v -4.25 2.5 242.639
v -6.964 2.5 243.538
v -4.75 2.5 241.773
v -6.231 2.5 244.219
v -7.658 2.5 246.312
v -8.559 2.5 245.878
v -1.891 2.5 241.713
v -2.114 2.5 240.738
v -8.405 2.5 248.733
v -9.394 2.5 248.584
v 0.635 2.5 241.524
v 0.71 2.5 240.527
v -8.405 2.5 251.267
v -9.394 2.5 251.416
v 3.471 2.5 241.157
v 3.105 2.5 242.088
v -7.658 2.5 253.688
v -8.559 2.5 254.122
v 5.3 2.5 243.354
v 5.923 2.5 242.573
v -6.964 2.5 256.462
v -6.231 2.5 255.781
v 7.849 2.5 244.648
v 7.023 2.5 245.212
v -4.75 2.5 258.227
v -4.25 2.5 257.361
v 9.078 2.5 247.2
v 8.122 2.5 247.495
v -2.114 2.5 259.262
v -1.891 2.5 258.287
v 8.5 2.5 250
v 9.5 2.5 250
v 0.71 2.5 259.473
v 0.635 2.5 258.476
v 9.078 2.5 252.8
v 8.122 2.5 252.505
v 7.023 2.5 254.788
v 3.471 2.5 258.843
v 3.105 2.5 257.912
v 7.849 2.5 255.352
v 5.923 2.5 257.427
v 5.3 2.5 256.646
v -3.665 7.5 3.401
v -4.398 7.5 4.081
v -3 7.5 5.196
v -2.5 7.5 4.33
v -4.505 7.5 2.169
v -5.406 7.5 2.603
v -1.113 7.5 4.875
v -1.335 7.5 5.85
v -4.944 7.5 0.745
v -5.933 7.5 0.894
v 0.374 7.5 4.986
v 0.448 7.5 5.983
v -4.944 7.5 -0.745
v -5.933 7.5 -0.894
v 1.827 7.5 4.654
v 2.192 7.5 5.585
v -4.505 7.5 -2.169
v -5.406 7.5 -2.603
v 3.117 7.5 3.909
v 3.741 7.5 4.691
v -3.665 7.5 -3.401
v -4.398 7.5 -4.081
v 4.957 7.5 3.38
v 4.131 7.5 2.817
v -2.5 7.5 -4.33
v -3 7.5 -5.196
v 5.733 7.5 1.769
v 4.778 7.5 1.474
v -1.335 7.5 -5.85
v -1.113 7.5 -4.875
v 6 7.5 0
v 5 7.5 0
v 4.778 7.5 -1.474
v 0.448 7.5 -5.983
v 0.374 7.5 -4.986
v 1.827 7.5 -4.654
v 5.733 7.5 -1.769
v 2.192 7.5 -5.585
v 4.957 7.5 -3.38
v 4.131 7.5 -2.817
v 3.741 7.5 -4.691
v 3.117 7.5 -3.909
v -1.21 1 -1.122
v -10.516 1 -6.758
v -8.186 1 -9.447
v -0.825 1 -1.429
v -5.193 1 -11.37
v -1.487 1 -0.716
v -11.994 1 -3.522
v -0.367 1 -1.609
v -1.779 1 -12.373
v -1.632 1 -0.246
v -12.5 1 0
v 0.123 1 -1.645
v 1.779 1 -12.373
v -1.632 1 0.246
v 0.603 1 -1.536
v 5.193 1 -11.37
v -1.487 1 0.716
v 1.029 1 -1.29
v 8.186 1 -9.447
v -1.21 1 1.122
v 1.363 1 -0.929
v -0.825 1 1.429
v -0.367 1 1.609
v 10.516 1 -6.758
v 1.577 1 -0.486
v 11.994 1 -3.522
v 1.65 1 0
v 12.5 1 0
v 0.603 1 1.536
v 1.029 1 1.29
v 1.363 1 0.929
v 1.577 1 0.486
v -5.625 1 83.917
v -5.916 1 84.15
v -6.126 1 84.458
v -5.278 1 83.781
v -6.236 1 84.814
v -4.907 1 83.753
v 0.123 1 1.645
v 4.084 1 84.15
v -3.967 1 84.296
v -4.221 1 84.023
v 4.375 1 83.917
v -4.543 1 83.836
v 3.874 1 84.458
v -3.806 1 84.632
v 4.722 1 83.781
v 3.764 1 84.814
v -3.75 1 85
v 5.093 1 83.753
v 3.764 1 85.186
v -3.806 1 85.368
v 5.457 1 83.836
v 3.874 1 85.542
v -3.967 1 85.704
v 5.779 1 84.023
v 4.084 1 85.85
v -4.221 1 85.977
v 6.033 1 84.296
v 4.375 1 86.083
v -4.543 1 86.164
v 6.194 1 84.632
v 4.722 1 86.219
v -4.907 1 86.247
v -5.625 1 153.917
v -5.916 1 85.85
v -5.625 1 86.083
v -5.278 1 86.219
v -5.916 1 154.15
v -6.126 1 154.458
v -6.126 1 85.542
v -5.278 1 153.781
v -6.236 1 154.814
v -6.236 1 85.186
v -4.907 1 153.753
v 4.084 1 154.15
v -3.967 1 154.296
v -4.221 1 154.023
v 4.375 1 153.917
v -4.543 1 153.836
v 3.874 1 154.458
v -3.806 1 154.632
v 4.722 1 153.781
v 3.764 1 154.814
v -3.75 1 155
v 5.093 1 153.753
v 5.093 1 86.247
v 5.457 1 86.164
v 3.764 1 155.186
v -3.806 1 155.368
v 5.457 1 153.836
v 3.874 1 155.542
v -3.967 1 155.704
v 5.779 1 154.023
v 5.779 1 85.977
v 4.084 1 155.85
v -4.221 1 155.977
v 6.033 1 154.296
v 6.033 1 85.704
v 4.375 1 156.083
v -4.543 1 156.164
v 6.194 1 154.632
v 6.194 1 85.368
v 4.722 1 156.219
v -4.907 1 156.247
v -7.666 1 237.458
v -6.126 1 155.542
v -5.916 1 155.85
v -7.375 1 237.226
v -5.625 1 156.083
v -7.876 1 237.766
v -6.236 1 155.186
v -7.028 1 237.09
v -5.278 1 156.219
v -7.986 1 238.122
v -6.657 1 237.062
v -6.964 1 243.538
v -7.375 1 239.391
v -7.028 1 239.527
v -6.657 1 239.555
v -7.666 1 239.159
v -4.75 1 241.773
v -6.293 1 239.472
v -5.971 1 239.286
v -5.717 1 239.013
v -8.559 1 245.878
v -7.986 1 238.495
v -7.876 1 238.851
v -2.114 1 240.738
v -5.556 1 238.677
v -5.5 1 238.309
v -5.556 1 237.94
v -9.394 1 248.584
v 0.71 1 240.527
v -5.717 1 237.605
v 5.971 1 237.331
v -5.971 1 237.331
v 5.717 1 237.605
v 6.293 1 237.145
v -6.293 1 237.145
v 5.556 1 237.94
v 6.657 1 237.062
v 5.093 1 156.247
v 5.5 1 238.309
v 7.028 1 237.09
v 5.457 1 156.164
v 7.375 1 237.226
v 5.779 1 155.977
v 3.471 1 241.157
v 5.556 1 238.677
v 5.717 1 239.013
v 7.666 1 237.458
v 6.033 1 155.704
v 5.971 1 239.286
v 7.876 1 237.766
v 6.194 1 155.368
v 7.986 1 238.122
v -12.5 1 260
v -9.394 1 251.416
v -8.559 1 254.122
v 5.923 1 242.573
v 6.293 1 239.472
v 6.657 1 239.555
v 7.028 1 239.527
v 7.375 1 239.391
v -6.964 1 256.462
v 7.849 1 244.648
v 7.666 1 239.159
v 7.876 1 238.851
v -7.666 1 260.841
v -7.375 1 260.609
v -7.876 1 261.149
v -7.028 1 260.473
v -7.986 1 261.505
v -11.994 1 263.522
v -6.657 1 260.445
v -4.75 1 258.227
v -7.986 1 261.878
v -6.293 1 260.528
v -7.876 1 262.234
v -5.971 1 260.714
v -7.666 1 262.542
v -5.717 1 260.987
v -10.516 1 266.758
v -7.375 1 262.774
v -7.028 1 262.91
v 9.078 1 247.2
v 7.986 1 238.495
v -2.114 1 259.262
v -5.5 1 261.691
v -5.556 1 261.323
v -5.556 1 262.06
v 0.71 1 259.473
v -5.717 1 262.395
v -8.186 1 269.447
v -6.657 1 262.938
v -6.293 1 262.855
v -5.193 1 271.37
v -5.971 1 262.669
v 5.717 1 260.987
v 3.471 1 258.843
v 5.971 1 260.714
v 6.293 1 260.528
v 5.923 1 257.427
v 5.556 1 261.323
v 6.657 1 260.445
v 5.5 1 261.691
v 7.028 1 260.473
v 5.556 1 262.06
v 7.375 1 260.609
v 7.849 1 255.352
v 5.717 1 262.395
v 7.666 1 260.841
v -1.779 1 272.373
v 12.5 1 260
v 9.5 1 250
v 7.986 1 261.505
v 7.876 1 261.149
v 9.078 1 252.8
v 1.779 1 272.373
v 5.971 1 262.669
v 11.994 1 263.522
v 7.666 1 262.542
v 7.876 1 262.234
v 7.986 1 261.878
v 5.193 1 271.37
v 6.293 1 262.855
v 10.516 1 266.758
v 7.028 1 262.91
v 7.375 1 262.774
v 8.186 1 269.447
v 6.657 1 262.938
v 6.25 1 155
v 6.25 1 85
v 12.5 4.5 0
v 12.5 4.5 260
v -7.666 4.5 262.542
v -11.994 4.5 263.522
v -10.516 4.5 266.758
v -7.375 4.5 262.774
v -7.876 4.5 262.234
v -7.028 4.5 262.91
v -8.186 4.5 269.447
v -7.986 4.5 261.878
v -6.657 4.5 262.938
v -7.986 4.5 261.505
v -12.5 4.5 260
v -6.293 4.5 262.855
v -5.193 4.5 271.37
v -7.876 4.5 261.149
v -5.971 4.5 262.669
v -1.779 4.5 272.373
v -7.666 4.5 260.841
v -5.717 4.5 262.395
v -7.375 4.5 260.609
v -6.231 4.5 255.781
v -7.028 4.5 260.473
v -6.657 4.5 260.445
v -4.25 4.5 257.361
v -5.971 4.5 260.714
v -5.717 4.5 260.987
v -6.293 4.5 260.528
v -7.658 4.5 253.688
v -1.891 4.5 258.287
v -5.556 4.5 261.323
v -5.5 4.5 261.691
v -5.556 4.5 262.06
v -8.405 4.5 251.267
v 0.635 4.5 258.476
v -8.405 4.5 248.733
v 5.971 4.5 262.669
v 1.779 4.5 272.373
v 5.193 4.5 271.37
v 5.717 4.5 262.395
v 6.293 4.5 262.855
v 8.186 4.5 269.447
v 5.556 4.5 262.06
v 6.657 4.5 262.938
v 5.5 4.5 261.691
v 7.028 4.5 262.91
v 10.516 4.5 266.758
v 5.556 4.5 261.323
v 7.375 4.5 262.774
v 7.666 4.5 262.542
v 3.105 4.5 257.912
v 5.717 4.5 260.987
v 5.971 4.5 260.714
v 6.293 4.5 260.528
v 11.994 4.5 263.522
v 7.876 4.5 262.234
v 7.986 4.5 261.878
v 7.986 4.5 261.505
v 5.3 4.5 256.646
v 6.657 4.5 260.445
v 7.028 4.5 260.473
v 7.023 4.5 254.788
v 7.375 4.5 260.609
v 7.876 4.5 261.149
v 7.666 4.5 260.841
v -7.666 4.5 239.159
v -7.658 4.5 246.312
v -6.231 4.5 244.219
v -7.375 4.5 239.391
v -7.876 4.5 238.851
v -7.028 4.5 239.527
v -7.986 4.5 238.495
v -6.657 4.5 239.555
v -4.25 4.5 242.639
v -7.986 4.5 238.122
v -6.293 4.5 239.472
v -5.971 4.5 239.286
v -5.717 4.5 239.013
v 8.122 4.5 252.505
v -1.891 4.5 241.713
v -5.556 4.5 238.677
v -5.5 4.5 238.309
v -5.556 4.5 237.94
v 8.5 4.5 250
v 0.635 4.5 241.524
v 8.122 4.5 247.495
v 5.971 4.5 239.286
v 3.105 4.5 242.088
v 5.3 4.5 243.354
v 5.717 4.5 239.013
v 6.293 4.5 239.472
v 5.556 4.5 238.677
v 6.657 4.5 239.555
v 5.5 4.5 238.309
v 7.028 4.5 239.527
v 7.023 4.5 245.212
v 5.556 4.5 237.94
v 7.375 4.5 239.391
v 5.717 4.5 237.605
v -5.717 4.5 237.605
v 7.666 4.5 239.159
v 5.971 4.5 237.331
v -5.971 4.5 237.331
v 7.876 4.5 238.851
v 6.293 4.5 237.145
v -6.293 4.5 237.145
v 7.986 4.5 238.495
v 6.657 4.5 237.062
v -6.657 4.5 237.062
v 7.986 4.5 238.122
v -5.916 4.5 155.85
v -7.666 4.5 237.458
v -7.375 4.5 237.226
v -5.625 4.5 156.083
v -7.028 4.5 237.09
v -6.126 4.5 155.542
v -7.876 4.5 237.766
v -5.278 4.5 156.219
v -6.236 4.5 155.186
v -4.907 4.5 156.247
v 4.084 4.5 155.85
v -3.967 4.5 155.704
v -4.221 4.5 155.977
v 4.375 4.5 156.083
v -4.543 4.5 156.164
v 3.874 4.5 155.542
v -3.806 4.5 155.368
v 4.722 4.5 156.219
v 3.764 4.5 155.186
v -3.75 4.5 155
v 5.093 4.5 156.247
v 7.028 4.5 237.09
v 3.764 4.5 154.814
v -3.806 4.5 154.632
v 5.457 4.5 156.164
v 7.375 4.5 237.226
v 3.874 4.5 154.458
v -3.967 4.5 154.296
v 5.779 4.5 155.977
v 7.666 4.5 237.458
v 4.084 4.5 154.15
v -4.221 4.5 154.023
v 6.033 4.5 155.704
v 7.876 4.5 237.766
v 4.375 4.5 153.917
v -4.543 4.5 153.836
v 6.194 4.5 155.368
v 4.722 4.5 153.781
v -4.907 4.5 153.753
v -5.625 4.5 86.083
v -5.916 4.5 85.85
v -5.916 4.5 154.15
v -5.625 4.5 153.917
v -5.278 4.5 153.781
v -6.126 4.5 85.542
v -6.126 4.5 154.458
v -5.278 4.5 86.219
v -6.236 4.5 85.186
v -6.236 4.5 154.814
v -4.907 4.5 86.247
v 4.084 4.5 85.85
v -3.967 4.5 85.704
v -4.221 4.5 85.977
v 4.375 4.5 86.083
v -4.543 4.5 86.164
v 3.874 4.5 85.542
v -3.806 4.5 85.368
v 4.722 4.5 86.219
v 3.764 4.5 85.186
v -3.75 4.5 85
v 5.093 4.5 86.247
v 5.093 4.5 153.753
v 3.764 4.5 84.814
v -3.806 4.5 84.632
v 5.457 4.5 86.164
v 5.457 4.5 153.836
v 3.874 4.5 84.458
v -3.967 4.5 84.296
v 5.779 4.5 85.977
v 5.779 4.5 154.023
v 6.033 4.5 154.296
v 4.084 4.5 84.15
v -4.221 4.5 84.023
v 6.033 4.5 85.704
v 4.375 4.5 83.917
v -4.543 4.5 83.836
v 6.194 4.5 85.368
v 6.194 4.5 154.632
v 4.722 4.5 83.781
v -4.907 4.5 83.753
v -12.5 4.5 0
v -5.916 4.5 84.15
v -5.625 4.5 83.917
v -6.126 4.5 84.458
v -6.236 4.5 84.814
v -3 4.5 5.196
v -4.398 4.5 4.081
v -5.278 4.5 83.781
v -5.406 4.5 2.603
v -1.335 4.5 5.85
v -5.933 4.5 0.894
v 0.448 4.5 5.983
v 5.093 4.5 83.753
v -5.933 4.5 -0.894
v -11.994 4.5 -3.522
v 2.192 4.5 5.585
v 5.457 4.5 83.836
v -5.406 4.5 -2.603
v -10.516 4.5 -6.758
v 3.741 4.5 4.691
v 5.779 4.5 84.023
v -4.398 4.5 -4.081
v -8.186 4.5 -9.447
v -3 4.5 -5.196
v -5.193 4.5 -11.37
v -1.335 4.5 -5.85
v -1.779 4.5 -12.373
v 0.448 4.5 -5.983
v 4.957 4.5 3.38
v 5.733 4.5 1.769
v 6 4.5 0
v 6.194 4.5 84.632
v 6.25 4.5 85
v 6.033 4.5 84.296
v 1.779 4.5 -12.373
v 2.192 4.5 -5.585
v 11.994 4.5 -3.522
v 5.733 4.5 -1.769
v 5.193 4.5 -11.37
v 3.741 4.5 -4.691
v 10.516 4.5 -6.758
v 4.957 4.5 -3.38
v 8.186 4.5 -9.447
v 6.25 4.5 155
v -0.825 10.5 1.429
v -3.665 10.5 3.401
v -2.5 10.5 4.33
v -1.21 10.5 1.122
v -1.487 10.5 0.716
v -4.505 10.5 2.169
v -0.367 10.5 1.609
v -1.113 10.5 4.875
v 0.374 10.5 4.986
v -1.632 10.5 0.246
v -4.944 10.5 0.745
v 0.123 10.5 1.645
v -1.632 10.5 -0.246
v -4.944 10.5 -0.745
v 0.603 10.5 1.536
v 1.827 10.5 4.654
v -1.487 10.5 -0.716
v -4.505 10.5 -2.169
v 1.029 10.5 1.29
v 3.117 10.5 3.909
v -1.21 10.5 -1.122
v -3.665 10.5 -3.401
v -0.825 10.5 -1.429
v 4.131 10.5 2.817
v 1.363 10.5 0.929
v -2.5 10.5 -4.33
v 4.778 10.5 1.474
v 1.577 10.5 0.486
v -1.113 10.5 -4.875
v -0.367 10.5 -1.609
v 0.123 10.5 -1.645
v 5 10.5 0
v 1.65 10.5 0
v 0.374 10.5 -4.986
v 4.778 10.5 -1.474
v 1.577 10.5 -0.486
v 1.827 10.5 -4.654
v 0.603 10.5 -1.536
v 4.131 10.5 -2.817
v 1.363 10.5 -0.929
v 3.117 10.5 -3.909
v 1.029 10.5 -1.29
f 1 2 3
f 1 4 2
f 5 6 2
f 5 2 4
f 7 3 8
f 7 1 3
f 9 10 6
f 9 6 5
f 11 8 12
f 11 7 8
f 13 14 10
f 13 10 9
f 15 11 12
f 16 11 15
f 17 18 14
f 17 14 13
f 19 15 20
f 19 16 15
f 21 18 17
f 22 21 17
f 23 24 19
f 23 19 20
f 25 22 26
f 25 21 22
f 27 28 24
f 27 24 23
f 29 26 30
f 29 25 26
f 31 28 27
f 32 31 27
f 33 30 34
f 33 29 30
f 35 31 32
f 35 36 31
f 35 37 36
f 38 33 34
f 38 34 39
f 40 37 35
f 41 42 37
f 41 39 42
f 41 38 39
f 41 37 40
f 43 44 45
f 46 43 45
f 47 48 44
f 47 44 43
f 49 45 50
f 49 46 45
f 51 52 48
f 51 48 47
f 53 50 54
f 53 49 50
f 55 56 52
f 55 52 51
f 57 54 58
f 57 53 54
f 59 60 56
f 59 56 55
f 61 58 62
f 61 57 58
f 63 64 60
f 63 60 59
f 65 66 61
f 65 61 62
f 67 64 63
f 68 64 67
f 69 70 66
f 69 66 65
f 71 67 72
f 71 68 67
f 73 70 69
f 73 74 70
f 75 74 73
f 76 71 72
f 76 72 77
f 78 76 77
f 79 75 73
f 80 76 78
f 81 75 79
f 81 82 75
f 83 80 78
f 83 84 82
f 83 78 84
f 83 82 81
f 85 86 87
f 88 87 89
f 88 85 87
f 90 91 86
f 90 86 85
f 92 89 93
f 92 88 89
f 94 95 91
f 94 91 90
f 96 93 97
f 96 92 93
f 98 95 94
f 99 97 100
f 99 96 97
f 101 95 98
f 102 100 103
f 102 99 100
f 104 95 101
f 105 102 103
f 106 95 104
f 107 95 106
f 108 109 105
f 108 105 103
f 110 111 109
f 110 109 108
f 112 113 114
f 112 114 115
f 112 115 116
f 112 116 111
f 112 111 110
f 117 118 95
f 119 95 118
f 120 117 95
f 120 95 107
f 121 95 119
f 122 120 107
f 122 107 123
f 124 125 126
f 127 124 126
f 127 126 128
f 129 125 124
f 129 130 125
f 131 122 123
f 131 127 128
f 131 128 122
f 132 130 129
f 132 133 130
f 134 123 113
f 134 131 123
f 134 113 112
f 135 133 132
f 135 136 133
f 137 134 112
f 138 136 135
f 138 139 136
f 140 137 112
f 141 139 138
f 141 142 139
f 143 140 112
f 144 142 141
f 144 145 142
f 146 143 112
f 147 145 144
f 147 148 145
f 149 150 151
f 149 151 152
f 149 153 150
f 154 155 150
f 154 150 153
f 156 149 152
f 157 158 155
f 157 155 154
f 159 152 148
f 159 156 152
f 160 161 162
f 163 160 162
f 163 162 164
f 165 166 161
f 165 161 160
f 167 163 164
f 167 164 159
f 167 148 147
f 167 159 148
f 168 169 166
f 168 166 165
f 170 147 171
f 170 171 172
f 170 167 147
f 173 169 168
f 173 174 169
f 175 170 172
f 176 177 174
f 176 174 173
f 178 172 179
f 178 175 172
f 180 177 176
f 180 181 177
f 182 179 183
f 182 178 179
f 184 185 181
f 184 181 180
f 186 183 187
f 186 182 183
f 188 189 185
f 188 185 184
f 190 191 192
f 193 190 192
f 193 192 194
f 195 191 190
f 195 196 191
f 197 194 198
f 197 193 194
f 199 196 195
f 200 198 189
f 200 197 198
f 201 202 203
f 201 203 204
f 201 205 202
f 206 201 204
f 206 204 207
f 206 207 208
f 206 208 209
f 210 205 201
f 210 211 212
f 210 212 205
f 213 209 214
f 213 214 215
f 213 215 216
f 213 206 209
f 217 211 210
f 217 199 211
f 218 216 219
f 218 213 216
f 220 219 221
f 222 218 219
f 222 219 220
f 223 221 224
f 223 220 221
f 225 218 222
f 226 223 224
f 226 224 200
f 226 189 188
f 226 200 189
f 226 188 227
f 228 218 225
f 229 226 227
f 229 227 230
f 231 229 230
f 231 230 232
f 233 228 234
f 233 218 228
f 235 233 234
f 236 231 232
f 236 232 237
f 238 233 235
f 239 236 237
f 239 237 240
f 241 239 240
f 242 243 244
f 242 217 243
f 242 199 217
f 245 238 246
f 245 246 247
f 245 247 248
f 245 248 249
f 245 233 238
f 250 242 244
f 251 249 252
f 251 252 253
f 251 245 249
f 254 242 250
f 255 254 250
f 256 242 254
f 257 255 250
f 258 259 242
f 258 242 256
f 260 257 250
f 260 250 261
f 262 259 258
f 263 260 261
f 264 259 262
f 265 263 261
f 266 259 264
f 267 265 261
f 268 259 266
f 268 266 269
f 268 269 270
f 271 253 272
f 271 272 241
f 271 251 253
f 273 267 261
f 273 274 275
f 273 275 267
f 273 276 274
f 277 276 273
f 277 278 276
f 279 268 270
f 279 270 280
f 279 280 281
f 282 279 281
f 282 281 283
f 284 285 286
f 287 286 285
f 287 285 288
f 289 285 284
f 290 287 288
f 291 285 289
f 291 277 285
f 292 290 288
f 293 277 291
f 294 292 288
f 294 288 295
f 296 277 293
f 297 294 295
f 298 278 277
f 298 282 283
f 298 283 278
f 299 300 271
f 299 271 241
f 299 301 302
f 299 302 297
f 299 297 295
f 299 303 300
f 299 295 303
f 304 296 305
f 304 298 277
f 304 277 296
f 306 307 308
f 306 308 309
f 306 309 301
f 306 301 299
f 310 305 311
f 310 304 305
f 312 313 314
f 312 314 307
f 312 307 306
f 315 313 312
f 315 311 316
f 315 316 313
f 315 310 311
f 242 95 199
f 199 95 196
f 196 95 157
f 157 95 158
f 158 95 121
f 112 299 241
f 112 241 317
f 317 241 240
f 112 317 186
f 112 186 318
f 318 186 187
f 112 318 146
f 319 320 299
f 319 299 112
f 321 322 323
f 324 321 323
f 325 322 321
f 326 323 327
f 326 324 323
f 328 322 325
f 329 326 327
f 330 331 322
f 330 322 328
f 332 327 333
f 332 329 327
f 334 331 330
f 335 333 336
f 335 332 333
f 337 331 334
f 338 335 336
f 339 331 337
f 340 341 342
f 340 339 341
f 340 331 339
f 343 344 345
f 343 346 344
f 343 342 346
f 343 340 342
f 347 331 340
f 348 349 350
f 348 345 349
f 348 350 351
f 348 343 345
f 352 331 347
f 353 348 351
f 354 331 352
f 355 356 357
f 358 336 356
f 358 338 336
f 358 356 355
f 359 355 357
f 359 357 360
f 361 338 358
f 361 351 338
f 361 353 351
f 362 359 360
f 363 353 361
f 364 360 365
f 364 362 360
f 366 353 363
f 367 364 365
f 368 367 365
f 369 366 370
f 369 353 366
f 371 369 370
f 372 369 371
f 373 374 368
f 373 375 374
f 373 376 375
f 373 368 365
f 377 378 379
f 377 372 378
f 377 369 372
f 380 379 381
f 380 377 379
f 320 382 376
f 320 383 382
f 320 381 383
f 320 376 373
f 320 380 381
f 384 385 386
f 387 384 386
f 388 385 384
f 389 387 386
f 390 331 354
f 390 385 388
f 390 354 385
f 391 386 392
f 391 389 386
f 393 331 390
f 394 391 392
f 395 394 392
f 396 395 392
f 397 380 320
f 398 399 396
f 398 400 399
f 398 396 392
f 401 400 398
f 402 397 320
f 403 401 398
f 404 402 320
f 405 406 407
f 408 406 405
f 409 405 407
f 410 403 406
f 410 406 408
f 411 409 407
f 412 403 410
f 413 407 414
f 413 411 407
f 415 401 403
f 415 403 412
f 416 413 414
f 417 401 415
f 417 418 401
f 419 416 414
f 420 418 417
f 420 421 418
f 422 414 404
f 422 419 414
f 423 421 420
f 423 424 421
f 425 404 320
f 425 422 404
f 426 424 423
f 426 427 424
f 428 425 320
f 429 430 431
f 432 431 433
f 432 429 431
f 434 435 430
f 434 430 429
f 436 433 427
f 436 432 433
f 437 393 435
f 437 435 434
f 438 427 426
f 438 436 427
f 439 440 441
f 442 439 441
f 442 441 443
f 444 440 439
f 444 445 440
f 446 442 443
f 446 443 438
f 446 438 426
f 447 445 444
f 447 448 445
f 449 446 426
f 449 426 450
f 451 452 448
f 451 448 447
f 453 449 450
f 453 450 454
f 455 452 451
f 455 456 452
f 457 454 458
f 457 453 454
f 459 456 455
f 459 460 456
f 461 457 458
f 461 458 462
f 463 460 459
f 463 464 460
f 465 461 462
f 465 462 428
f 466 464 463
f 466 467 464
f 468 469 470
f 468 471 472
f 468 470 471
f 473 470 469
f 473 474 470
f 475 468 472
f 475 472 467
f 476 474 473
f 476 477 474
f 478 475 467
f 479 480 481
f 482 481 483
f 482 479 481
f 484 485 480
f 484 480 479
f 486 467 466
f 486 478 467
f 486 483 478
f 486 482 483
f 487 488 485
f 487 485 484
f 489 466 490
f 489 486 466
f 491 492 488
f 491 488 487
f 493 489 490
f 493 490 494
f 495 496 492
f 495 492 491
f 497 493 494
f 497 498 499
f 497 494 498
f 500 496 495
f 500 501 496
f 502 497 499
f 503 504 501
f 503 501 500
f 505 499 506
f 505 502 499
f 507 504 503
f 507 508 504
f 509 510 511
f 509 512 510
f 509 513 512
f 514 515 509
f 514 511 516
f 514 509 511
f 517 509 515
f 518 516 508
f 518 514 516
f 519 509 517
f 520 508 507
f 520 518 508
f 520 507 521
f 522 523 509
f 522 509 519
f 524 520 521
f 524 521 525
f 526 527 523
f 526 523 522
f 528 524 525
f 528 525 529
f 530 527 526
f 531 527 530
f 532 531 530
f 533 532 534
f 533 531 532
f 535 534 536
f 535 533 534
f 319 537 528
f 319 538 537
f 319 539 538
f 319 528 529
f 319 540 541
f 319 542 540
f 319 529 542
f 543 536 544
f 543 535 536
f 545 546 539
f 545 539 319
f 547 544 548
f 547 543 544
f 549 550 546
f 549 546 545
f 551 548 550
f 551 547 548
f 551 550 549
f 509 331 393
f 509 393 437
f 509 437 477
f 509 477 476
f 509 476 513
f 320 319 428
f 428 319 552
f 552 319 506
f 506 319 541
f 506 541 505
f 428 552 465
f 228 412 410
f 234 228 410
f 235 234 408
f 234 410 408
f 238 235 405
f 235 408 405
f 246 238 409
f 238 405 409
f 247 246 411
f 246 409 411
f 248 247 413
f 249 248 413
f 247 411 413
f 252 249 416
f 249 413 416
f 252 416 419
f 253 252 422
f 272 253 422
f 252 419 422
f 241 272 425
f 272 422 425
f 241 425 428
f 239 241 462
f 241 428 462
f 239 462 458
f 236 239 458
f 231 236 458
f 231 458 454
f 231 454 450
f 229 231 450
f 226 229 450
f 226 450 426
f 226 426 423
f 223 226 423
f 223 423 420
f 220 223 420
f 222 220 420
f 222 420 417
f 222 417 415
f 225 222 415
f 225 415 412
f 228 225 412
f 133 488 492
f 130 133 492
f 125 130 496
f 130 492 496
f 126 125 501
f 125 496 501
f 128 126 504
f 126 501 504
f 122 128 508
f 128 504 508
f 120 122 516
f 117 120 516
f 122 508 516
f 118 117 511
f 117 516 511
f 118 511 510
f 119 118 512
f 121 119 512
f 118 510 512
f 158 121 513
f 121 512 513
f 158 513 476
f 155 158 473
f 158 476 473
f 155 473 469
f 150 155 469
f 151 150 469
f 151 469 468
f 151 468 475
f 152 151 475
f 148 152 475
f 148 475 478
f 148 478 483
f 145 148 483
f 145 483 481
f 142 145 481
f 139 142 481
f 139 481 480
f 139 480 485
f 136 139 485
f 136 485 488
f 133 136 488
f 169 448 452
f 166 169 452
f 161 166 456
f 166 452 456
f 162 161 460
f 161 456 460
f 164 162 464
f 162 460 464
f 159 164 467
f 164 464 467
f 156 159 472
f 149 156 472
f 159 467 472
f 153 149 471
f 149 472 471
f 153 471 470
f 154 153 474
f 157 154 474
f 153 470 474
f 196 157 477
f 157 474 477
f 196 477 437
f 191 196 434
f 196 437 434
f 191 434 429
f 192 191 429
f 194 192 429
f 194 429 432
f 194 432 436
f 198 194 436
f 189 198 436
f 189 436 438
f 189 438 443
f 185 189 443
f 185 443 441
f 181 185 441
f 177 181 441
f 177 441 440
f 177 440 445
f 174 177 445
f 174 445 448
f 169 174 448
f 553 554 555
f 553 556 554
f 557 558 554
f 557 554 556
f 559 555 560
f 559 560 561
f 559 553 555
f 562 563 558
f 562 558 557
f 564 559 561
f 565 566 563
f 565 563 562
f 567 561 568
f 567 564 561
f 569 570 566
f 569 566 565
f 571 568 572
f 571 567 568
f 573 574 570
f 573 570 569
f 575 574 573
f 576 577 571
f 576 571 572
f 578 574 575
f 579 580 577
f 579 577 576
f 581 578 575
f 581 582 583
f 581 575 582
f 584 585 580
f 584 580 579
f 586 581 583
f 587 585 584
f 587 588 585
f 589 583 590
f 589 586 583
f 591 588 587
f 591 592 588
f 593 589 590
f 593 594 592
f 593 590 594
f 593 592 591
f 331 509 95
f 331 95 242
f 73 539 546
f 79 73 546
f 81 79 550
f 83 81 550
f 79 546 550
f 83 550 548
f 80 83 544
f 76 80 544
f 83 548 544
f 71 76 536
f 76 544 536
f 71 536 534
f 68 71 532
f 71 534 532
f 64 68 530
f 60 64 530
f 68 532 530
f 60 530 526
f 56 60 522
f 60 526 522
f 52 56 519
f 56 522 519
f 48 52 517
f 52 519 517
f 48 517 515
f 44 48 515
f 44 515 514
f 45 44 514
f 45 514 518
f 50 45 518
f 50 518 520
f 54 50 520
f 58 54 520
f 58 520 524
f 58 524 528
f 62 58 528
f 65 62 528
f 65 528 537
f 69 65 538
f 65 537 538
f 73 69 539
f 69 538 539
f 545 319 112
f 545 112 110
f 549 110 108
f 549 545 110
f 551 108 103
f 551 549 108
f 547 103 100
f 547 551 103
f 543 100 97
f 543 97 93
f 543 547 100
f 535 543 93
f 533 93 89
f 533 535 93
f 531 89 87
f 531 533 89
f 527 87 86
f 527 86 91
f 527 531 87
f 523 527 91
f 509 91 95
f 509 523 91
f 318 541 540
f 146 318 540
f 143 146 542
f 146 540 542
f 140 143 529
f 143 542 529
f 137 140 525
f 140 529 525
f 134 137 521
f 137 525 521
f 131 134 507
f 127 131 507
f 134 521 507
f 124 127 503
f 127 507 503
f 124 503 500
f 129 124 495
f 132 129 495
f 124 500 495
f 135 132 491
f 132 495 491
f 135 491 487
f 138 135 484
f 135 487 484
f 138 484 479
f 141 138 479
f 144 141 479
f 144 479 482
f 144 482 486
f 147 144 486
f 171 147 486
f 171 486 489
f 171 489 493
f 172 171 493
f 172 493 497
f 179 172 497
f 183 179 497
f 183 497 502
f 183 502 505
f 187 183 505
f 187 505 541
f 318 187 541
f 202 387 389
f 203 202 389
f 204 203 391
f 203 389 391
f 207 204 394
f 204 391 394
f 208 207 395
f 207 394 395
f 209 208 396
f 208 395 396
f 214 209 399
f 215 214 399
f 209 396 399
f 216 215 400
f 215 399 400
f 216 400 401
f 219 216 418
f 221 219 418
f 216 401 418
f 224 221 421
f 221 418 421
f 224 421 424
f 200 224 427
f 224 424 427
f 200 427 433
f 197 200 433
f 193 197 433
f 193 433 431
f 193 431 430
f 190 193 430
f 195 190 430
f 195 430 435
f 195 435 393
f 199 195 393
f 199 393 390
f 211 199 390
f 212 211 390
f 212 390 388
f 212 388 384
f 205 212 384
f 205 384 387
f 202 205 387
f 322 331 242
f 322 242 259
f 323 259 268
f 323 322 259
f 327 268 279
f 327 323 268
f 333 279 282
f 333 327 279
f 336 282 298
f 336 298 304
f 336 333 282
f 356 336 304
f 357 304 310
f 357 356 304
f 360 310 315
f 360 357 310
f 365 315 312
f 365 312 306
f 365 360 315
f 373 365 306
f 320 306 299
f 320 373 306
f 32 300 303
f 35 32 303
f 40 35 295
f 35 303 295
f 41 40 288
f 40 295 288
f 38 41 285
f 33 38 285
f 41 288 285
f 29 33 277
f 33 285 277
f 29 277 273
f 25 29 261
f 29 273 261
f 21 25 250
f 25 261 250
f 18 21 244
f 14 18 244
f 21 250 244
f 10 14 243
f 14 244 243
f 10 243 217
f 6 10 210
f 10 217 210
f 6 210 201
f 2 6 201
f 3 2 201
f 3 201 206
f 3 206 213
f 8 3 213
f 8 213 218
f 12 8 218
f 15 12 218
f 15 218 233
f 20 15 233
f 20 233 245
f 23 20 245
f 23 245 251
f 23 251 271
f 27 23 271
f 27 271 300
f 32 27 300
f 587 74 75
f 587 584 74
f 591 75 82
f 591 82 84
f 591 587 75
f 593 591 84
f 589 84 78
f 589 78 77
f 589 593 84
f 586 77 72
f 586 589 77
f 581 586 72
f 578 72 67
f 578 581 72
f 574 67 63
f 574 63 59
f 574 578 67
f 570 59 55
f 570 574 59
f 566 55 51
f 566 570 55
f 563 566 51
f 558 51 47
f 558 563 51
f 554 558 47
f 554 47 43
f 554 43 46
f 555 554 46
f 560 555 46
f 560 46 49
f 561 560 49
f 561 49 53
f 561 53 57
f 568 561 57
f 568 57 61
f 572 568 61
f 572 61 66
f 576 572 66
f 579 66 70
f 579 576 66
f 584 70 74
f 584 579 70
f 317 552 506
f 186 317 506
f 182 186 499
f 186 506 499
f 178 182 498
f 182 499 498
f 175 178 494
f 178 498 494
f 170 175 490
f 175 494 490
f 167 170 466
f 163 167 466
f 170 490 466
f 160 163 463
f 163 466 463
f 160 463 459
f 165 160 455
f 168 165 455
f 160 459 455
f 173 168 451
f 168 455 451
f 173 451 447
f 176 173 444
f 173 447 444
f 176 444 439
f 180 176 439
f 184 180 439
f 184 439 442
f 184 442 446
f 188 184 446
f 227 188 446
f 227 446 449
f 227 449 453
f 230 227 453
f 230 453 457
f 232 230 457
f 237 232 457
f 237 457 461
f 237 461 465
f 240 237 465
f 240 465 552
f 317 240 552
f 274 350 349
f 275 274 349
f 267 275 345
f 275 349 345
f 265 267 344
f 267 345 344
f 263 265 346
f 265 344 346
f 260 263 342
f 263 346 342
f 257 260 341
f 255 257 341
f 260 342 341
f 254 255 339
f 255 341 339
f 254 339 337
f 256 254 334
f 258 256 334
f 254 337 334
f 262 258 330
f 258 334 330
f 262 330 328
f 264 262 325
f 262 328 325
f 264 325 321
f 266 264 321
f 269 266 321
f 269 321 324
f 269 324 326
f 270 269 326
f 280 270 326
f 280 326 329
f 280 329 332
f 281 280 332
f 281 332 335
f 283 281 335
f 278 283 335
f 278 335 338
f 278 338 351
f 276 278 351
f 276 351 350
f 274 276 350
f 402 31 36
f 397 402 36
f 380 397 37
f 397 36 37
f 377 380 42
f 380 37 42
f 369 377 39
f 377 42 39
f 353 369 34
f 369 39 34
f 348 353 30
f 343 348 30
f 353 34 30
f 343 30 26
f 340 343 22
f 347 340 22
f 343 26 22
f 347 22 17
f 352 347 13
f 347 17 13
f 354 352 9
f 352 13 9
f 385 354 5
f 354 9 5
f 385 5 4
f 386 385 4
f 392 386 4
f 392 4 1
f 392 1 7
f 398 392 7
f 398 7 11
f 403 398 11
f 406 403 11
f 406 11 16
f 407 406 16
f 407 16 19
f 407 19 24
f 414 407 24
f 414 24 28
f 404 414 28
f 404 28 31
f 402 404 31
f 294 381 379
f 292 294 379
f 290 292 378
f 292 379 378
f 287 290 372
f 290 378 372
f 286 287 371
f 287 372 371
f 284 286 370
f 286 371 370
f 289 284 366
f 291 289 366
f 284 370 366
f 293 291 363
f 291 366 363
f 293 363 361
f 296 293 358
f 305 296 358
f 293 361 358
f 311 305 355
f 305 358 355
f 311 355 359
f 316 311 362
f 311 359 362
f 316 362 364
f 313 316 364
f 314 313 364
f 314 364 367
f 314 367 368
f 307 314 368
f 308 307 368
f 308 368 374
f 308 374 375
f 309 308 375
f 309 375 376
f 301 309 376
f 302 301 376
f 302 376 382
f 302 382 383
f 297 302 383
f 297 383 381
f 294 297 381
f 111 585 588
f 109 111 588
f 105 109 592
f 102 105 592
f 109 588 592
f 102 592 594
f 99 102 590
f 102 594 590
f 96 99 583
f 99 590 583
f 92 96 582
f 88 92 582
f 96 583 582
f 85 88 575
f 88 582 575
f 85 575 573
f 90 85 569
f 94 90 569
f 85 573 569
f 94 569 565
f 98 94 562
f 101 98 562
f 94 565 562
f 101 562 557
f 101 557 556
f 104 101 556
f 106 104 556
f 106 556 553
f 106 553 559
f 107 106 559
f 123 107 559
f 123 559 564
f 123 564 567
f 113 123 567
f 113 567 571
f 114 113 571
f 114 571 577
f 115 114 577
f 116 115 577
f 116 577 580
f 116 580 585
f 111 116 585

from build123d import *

# Parameters (mm, degrees)
EXTRUDE_1_DEPTH             = 10.5
EXTRUDE_1_DEPTH_BACK        = 10.5
SKETCH_1_R                  = 5
EXTRUDE_3_DEPTH             = 4.5
EXTRUDE_3_DEPTH_BACK        = 4.5
SKETCH_7_R                  = 6
EXTRUDE_4_DEPTH             = 3
EXTRUDE_START               = 3
SKETCH_8_R                  = 6
EXTRUDE_5_DEPTH             = 3
SKETCH_9_R                  = 9.5
CUT_EXTRUDE_1_DEPTH         = 7
SKETCH_10_R                 = 8.5
CUT_EXTRUDE_2_DEPTH         = 274.096136919
HOLE_WIZARD_M4_1_D          = 3.3
SKETCH_22_W                 = 46.630089335
SKETCH_22_H                 = 20.014444788
CUT_EXTRUDE_3_DEPTH         = 1111
HOLE_WIZARD_M3_2_D          = 2.5
PATTERN_LINEAR_1_COUNT      = 3
PATTERN_LINEAR_1_PITCH      = 70
PATTERN_LINEAR_1_COUNT_DIR2 = 2
PATTERN_LINEAR_1_PITCH_DIR2 = 10
HOLE_WIZARD_M3_1_D          = 2.5
PATTERN_CIRCULAR_1_COUNT    = 6
EXTRUDE_START_2             = -3.5
SKETCH_32_R                 = 1.25
EXTRUDE_6_DEPTH             = 3.5


with BuildPart() as part:
    # 스케치1 → 보스-돌출1 (new, two sides: drawn at the far end of the back side and taken through both)
    with BuildSketch(Plane(origin=(0, 0, 0), x_dir=(1, 0, 0), z_dir=(0, 1, 0)).offset(-EXTRUDE_1_DEPTH_BACK)):
        Circle(SKETCH_1_R)
    extrude(amount=EXTRUDE_1_DEPTH + EXTRUDE_1_DEPTH_BACK)

    # 스케치6 → 보스-돌출3 (add, two sides: drawn at the far end of the back side and taken through both)
    with BuildSketch(Plane(origin=(0, 0, 0), x_dir=(1, 0, 0), z_dir=(0, 1, 0)).offset(-EXTRUDE_3_DEPTH_BACK)):
        with BuildLine():
            Line((-12.5, 0), (-12.5, -260))
            ThreePointArc((-12.5, -260), (0, -272.5), (12.5, -260))
            Line((12.5, -260), (12.5, 0))
            ThreePointArc((12.5, 0), (0, 12.5), (-12.5, 0))
        make_face()
    extrude(amount=EXTRUDE_3_DEPTH + EXTRUDE_3_DEPTH_BACK)

    # 스케치7 → 보스-돌출4 (add)
    with BuildSketch(Plane.XZ.offset(4.5)):
        Circle(SKETCH_7_R)
    extrude(amount=EXTRUDE_4_DEPTH)

    # 스케치8 → 보스-돌출5 (add)
    with BuildSketch(Plane(origin=(0, 4.5, 0), x_dir=(1, 0, 0), z_dir=(0, 1, 0)).offset(EXTRUDE_START)):
        Circle(SKETCH_8_R)
    extrude(amount=-EXTRUDE_5_DEPTH)

    # 스케치9 → 컷-돌출1 (cut)
    with BuildSketch(Plane.XZ.offset(4.5)):
        with Locations((0, 250)):
            Circle(SKETCH_9_R)
    extrude(amount=-CUT_EXTRUDE_1_DEPTH, mode=Mode.SUBTRACT)

    # 스케치10 → 컷-돌출2 (cut, through all)
    with BuildSketch(Plane.XZ.offset(-2.5)):
        with Locations((0, 250)):
            Circle(SKETCH_10_R)
    extrude(amount=-CUT_EXTRUDE_2_DEPTH, mode=Mode.SUBTRACT)

    # M4 탭을 위한 탭 드릴1 (through all)
    with Locations(Plane(origin=(0, -10.5, 0), x_dir=(-1, 0, 0), z_dir=(0, -1, 0))):
        with Locations((0, 0)):
            Hole(HOLE_WIZARD_M4_1_D / 2)

    # 스케치22 → 컷-돌출3 (cut, symmetric)
    with BuildSketch(Plane.XY):
        with Locations((-0.058287612, -9.007222394)):
            Rectangle(SKETCH_22_W, SKETCH_22_H)
    extrude(amount=CUT_EXTRUDE_3_DEPTH, both=True, mode=Mode.SUBTRACT)

    # M3 탭을 위한 탭 드릴2 (through all)
    with Locations(Plane(origin=(0, 1, 0), x_dir=(-1, 0, 0), z_dir=(0, -1, 0))):
        with Locations((5, -15)):
            hole_wizard_m3_2 = Hole(HOLE_WIZARD_M3_2_D / 2)

    # 선형 패턴1: Hole Wizard M3 _ _ _ _2 3 × 2
    with Locations(*[(j * PATTERN_LINEAR_1_PITCH_DIR2, 0, i * PATTERN_LINEAR_1_PITCH) for i in range(PATTERN_LINEAR_1_COUNT) for j in range(PATTERN_LINEAR_1_COUNT_DIR2) if (i, j) != (0, 0)]):
        add(hole_wizard_m3_2, mode=Mode.SUBTRACT)

    # M3 탭을 위한 탭 드릴1 (through all)
    with Locations(Plane(origin=(0, 1, 0), x_dir=(-1, 0, 0), z_dir=(0, -1, 0))):
        with Locations((6.75, -261.691342951)):
            hole_wizard_m3_1 = Hole(HOLE_WIZARD_M3_1_D / 2)

    # 원형 패턴1: M3 탭을 위한 탭 드릴1 ×6 about axis, 2 skipped
    pattern_circular_1_axis = Axis((0, 2.5, 250), (0, -1, 0))
    add([hole_wizard_m3_1.rotate(pattern_circular_1_axis, i * 360 / PATTERN_CIRCULAR_1_COUNT) for i in range(1, PATTERN_CIRCULAR_1_COUNT) if i not in (1, 4)], mode=Mode.SUBTRACT)

    # 스케치32 → 보스-돌출6 (add)
    with BuildSketch(Plane.XZ.offset(-1).offset(EXTRUDE_START_2)):
        with Locations((-5, 15)):
            Circle(SKETCH_32_R)
        with Locations((5, 15)):
            Circle(SKETCH_32_R)
    extrude(amount=EXTRUDE_6_DEPTH)


solid = part.part
